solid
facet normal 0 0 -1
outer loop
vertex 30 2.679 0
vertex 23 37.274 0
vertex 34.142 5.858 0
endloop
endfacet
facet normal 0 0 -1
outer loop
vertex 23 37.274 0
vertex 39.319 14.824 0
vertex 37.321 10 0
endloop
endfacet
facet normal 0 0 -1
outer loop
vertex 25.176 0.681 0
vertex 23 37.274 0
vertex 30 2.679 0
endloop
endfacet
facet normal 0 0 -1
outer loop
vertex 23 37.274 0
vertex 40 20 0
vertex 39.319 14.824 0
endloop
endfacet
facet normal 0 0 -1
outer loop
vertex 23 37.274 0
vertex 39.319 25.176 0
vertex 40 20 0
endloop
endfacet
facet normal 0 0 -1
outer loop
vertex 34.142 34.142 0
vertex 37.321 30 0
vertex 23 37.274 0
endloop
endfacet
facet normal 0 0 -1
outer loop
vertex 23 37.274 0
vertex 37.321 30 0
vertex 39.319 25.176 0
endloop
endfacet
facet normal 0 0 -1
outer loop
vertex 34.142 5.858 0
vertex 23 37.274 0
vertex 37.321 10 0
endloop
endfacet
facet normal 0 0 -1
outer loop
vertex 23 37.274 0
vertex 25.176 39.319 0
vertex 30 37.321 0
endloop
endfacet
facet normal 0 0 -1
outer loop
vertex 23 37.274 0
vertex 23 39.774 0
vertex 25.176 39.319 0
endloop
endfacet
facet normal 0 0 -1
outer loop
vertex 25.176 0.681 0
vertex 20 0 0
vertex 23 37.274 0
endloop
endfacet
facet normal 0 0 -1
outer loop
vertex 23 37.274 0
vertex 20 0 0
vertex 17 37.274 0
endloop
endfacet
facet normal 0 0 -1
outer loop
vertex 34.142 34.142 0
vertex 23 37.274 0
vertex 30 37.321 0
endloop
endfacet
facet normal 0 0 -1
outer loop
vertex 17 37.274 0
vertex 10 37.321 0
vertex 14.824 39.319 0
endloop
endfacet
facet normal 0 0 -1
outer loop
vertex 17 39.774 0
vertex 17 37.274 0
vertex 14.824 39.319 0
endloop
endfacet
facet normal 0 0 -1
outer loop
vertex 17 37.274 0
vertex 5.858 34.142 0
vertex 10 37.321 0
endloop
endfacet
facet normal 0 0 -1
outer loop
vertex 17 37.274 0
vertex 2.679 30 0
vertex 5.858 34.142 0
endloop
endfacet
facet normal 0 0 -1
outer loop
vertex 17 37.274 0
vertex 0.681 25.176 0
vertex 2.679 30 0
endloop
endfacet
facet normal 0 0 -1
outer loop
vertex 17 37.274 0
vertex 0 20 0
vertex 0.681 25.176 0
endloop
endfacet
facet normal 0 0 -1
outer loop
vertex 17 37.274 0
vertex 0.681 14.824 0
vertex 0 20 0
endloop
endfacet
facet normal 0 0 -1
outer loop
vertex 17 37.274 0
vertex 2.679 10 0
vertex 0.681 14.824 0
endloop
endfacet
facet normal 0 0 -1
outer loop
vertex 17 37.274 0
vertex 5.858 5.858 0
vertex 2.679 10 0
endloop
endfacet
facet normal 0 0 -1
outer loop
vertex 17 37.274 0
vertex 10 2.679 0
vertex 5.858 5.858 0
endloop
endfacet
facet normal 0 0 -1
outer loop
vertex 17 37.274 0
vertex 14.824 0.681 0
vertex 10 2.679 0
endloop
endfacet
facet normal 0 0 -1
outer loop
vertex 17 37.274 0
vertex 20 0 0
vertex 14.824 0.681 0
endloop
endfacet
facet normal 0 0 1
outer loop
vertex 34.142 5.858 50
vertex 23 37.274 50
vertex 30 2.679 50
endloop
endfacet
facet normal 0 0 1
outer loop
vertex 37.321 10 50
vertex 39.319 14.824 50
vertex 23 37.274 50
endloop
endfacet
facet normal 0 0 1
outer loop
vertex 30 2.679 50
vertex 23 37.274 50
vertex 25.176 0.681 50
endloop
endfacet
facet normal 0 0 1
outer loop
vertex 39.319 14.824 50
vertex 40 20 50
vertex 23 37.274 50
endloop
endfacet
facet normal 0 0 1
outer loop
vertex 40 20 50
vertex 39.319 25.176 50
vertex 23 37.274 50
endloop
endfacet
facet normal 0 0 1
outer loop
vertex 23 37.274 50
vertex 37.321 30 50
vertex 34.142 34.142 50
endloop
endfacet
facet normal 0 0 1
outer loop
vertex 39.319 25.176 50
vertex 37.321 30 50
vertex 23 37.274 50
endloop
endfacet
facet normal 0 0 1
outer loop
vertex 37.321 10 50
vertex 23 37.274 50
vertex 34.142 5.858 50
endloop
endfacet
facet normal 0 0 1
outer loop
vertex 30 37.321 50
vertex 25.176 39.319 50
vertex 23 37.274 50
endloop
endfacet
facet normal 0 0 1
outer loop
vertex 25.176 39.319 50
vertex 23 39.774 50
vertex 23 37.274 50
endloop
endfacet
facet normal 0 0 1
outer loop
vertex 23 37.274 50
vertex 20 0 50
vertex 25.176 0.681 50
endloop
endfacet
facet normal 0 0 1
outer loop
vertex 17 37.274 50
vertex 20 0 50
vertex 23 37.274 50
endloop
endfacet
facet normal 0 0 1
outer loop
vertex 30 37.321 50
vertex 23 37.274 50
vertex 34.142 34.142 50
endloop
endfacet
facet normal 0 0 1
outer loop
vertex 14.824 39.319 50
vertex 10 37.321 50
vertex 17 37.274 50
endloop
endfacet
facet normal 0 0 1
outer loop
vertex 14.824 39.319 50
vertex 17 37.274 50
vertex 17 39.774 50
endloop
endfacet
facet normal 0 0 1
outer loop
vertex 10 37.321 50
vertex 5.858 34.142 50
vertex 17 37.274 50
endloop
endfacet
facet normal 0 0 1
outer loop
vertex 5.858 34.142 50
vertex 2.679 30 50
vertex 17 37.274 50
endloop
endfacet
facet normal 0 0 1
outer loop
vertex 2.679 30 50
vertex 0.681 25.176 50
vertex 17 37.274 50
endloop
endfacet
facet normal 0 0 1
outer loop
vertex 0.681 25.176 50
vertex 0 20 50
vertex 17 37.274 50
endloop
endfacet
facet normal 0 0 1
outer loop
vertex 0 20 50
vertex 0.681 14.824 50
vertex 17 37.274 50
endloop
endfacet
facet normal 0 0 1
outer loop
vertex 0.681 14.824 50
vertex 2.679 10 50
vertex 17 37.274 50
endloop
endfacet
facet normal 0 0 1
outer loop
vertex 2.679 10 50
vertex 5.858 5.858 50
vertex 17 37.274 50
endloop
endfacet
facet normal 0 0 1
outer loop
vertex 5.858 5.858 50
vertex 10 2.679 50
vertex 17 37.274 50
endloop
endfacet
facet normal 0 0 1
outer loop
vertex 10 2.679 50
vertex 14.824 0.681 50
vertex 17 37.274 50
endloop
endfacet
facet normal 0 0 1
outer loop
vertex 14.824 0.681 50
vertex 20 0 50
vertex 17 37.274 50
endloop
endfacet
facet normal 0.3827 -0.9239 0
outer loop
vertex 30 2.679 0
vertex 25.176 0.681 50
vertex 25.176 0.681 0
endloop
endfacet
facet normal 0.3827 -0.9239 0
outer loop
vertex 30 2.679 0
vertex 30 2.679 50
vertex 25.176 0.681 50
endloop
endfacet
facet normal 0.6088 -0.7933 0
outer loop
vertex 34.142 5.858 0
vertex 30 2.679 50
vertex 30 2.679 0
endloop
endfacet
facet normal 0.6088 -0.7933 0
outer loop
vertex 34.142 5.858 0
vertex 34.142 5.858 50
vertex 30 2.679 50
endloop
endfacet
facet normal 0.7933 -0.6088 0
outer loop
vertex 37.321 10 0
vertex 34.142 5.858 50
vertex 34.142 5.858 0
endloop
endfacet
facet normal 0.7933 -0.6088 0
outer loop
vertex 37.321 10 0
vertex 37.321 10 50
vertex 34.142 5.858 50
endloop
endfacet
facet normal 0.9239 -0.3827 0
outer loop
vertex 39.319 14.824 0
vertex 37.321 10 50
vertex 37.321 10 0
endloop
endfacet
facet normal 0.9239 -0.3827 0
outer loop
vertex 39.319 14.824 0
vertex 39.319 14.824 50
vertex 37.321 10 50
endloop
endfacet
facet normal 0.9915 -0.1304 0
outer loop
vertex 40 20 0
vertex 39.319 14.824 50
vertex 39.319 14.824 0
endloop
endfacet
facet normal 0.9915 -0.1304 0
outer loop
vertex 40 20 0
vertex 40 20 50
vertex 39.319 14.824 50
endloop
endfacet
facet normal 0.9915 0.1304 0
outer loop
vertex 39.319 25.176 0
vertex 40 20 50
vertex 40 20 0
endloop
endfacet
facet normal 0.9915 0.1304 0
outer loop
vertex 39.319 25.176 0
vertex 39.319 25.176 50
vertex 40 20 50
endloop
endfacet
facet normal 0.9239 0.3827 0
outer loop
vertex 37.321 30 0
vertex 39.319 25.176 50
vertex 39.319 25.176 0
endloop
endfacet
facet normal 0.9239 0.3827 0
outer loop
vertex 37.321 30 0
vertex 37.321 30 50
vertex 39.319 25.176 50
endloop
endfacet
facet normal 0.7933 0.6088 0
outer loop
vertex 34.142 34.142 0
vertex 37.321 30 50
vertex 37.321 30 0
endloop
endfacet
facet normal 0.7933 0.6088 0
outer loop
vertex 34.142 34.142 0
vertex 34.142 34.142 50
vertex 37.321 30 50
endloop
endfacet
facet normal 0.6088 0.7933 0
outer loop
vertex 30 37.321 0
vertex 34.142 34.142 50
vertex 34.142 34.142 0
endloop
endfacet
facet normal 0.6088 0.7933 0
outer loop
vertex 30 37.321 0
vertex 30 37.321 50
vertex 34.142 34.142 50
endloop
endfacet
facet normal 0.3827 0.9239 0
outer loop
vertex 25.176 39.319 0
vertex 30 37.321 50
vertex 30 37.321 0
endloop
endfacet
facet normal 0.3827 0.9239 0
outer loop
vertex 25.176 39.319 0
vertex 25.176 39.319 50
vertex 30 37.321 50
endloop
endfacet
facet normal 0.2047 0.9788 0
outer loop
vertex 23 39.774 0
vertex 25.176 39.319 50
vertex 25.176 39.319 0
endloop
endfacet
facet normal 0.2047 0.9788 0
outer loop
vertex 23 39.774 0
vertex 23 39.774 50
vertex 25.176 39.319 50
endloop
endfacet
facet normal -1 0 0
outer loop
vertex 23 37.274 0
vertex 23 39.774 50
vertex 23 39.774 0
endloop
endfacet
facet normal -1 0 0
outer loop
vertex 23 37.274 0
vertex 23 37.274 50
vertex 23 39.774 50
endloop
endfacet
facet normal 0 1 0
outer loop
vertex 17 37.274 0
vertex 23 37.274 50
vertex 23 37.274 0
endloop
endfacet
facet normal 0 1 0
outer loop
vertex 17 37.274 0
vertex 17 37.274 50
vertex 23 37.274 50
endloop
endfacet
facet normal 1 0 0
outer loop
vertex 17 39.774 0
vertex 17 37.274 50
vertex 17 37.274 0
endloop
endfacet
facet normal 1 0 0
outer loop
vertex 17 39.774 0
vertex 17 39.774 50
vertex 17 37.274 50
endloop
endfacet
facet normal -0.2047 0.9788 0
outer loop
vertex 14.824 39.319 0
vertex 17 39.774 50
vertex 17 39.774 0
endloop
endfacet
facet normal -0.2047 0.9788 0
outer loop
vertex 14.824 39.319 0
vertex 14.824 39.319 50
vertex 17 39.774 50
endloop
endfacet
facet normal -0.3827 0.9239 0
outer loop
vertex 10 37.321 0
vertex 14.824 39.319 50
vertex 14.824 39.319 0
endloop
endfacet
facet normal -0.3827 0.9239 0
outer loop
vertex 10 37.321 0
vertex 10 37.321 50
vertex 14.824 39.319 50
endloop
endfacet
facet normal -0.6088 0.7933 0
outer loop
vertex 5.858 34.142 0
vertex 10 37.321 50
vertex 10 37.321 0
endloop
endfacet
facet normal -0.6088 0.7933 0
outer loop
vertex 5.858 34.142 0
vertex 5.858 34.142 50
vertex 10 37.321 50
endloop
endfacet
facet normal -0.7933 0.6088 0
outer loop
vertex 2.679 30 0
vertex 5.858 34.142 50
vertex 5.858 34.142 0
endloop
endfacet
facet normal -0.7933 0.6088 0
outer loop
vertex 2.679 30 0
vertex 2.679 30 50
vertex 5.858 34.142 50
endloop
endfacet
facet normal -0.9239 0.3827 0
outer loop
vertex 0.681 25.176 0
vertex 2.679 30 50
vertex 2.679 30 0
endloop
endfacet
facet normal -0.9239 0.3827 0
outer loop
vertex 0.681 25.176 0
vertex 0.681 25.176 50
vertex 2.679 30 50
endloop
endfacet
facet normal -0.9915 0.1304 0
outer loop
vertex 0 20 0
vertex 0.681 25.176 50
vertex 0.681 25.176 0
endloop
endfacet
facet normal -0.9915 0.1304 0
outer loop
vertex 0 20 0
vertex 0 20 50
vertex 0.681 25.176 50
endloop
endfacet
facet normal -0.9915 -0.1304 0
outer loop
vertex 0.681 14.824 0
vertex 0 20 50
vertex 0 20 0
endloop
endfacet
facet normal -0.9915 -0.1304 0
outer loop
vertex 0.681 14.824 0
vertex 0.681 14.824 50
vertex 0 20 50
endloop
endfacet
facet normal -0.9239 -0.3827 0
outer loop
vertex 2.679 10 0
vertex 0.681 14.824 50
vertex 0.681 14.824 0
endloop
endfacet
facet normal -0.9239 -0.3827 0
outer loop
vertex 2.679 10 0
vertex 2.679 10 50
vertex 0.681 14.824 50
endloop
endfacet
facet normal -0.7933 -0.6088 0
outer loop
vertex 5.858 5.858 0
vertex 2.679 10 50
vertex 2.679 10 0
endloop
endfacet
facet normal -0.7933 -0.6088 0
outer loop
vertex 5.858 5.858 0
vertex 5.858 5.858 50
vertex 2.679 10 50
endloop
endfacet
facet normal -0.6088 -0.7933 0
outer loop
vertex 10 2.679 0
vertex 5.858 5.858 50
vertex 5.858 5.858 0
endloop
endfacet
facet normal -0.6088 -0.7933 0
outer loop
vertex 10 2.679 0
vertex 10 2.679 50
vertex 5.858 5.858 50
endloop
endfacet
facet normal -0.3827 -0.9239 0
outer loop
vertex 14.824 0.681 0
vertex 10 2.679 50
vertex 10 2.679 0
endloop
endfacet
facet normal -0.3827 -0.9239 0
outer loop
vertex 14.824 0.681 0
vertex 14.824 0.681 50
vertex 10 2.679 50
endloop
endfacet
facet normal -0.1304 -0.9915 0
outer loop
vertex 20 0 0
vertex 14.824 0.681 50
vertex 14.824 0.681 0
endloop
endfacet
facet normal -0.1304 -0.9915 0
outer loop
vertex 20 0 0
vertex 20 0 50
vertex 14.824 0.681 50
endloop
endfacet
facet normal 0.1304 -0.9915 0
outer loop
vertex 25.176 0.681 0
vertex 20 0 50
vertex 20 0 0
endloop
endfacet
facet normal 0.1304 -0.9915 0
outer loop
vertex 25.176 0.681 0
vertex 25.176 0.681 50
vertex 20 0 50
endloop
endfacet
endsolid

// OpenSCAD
$fn = 32;

// ----------------------------------------------------------------------
// Keyway shaft: d40 shaft, key 6 x 2.5 mm
// ----------------------------------------------------------------------

// --- parameters (mm) ---
shaft_r = 20;             // shaft radius
key_w = 6;                // keyway width
key_d = 2.5;              // keyway depth below the surface line
plate_t = 50;             // shaft length, Z (extrusion height)
fit_tol = 0.05;           // declared fit tolerance (prompt contract)
free_tol = 0.2;           // declared free tolerance (prompt contract)

shaft_d = 2 * shaft_r;  // shaft diameter
circle_step = 15;  // polygon sampling step, degrees

profile = [[14.824, 39.319], [10, 37.321], [5.858, 34.142], [2.679, 30], [0.681, 25.176], [0, 20], [0.681, 14.824], [2.679, 10], [5.858, 5.858], [10, 2.679], [14.824, 0.681], [20, 0], [25.176, 0.681], [30, 2.679], [34.142, 5.858], [37.321, 10], [39.319, 14.824], [40, 20], [39.319, 25.176], [37.321, 30], [34.142, 34.142], [30, 37.321], [25.176, 39.319], [23, 39.774], [23, 37.274], [17, 37.274], [17, 39.774]];  // primary outline, 27 points, counter clockwise

// --- the one profile operation ---
linear_extrude(height = plate_t) polygon(points = profile);
